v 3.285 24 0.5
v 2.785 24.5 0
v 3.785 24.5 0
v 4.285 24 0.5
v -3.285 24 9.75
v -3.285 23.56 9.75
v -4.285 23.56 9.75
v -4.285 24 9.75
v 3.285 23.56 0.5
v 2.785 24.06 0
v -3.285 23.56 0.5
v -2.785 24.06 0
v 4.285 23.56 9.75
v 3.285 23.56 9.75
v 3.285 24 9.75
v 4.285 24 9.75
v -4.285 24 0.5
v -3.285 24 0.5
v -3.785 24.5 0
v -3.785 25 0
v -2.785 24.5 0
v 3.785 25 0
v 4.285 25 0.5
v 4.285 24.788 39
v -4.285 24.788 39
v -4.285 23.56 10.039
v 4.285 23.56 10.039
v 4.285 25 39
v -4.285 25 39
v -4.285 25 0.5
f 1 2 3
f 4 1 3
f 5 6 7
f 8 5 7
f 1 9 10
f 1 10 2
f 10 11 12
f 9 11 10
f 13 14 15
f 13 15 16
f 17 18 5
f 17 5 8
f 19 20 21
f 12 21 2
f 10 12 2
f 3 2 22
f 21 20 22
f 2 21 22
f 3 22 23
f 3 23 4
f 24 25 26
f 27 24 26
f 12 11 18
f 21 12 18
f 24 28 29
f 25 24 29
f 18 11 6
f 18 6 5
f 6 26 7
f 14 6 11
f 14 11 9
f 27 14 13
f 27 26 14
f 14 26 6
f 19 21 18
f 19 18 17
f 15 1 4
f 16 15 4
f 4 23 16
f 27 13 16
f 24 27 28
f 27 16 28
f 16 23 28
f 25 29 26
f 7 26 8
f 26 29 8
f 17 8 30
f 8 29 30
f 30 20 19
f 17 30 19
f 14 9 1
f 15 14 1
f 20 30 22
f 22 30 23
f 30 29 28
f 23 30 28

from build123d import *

# Parameters (mm, degrees)
PAD003_DEPTH    = 1.44
POCKET004_DEPTH = 9.75
POCKET005_DEPTH = 8.570714
CHAMFER002_SIZE = 0.5


with BuildPart() as part:
    # Sketch010 → Pad003 (new body)
    with BuildSketch(Plane.XZ):
        Polygon((-4.284857, 0), (4.284857, 0), (4.284857, 9.75), (4.284857, 39), (-4.284857, 39), (-4.284857, 9.75), align=None)
    extrude(amount=PAD003_DEPTH)

    # Sketch011 (on Face1 of Pad003) → Pocket004 (cut)
    with BuildSketch(Plane(origin=(0, 0, 0), x_dir=(1, 0, 0), z_dir=(0, 0, -1))):
        Polygon((-3.284857, 1.44), (-3.284857, 1), (-8.284857, 1), (-8.284857, 4.941038), align=None)
        Polygon((8.284857, 4.941038), (3.284857, 1.44), (3.284857, 1), (8.284857, 1), align=None)
    extrude(amount=-POCKET004_DEPTH, mode=Mode.SUBTRACT)

    # Sketch012 (on Face9 of Pocket004) → Pocket005 (cut, through all)
    with BuildSketch(Plane(origin=(-4.284857, 0, 0), x_dir=(0, 0, -1), z_dir=(-1, 0, 0))):
        Polygon((-39.051991, 0.21), (-10.038814, 1.44), (-39.051991, 14.04), align=None)
    extrude(amount=-POCKET005_DEPTH, mode=Mode.SUBTRACT)

    # Chamfer002
    chamfer002_edges = [part.edges().sort_by_distance(p)[0] for p in [
        (-3.784857, -1, 0),
        (-3.284857, -1.22, 0),
        (0, -1.44, 0),
        (3.284857, -1.22, 0),
        (3.784857, -1, 0),
        (-4.284857, -0.5, 0),
        (4.284857, -0.5, 0),
    ]]
    chamfer(chamfer002_edges, length=CHAMFER002_SIZE)


with BuildPart() as part_1:
    # Body001 placement: moved
    add(part.part.moved(Location((0, 25, 0))))


solid = part_1.part
